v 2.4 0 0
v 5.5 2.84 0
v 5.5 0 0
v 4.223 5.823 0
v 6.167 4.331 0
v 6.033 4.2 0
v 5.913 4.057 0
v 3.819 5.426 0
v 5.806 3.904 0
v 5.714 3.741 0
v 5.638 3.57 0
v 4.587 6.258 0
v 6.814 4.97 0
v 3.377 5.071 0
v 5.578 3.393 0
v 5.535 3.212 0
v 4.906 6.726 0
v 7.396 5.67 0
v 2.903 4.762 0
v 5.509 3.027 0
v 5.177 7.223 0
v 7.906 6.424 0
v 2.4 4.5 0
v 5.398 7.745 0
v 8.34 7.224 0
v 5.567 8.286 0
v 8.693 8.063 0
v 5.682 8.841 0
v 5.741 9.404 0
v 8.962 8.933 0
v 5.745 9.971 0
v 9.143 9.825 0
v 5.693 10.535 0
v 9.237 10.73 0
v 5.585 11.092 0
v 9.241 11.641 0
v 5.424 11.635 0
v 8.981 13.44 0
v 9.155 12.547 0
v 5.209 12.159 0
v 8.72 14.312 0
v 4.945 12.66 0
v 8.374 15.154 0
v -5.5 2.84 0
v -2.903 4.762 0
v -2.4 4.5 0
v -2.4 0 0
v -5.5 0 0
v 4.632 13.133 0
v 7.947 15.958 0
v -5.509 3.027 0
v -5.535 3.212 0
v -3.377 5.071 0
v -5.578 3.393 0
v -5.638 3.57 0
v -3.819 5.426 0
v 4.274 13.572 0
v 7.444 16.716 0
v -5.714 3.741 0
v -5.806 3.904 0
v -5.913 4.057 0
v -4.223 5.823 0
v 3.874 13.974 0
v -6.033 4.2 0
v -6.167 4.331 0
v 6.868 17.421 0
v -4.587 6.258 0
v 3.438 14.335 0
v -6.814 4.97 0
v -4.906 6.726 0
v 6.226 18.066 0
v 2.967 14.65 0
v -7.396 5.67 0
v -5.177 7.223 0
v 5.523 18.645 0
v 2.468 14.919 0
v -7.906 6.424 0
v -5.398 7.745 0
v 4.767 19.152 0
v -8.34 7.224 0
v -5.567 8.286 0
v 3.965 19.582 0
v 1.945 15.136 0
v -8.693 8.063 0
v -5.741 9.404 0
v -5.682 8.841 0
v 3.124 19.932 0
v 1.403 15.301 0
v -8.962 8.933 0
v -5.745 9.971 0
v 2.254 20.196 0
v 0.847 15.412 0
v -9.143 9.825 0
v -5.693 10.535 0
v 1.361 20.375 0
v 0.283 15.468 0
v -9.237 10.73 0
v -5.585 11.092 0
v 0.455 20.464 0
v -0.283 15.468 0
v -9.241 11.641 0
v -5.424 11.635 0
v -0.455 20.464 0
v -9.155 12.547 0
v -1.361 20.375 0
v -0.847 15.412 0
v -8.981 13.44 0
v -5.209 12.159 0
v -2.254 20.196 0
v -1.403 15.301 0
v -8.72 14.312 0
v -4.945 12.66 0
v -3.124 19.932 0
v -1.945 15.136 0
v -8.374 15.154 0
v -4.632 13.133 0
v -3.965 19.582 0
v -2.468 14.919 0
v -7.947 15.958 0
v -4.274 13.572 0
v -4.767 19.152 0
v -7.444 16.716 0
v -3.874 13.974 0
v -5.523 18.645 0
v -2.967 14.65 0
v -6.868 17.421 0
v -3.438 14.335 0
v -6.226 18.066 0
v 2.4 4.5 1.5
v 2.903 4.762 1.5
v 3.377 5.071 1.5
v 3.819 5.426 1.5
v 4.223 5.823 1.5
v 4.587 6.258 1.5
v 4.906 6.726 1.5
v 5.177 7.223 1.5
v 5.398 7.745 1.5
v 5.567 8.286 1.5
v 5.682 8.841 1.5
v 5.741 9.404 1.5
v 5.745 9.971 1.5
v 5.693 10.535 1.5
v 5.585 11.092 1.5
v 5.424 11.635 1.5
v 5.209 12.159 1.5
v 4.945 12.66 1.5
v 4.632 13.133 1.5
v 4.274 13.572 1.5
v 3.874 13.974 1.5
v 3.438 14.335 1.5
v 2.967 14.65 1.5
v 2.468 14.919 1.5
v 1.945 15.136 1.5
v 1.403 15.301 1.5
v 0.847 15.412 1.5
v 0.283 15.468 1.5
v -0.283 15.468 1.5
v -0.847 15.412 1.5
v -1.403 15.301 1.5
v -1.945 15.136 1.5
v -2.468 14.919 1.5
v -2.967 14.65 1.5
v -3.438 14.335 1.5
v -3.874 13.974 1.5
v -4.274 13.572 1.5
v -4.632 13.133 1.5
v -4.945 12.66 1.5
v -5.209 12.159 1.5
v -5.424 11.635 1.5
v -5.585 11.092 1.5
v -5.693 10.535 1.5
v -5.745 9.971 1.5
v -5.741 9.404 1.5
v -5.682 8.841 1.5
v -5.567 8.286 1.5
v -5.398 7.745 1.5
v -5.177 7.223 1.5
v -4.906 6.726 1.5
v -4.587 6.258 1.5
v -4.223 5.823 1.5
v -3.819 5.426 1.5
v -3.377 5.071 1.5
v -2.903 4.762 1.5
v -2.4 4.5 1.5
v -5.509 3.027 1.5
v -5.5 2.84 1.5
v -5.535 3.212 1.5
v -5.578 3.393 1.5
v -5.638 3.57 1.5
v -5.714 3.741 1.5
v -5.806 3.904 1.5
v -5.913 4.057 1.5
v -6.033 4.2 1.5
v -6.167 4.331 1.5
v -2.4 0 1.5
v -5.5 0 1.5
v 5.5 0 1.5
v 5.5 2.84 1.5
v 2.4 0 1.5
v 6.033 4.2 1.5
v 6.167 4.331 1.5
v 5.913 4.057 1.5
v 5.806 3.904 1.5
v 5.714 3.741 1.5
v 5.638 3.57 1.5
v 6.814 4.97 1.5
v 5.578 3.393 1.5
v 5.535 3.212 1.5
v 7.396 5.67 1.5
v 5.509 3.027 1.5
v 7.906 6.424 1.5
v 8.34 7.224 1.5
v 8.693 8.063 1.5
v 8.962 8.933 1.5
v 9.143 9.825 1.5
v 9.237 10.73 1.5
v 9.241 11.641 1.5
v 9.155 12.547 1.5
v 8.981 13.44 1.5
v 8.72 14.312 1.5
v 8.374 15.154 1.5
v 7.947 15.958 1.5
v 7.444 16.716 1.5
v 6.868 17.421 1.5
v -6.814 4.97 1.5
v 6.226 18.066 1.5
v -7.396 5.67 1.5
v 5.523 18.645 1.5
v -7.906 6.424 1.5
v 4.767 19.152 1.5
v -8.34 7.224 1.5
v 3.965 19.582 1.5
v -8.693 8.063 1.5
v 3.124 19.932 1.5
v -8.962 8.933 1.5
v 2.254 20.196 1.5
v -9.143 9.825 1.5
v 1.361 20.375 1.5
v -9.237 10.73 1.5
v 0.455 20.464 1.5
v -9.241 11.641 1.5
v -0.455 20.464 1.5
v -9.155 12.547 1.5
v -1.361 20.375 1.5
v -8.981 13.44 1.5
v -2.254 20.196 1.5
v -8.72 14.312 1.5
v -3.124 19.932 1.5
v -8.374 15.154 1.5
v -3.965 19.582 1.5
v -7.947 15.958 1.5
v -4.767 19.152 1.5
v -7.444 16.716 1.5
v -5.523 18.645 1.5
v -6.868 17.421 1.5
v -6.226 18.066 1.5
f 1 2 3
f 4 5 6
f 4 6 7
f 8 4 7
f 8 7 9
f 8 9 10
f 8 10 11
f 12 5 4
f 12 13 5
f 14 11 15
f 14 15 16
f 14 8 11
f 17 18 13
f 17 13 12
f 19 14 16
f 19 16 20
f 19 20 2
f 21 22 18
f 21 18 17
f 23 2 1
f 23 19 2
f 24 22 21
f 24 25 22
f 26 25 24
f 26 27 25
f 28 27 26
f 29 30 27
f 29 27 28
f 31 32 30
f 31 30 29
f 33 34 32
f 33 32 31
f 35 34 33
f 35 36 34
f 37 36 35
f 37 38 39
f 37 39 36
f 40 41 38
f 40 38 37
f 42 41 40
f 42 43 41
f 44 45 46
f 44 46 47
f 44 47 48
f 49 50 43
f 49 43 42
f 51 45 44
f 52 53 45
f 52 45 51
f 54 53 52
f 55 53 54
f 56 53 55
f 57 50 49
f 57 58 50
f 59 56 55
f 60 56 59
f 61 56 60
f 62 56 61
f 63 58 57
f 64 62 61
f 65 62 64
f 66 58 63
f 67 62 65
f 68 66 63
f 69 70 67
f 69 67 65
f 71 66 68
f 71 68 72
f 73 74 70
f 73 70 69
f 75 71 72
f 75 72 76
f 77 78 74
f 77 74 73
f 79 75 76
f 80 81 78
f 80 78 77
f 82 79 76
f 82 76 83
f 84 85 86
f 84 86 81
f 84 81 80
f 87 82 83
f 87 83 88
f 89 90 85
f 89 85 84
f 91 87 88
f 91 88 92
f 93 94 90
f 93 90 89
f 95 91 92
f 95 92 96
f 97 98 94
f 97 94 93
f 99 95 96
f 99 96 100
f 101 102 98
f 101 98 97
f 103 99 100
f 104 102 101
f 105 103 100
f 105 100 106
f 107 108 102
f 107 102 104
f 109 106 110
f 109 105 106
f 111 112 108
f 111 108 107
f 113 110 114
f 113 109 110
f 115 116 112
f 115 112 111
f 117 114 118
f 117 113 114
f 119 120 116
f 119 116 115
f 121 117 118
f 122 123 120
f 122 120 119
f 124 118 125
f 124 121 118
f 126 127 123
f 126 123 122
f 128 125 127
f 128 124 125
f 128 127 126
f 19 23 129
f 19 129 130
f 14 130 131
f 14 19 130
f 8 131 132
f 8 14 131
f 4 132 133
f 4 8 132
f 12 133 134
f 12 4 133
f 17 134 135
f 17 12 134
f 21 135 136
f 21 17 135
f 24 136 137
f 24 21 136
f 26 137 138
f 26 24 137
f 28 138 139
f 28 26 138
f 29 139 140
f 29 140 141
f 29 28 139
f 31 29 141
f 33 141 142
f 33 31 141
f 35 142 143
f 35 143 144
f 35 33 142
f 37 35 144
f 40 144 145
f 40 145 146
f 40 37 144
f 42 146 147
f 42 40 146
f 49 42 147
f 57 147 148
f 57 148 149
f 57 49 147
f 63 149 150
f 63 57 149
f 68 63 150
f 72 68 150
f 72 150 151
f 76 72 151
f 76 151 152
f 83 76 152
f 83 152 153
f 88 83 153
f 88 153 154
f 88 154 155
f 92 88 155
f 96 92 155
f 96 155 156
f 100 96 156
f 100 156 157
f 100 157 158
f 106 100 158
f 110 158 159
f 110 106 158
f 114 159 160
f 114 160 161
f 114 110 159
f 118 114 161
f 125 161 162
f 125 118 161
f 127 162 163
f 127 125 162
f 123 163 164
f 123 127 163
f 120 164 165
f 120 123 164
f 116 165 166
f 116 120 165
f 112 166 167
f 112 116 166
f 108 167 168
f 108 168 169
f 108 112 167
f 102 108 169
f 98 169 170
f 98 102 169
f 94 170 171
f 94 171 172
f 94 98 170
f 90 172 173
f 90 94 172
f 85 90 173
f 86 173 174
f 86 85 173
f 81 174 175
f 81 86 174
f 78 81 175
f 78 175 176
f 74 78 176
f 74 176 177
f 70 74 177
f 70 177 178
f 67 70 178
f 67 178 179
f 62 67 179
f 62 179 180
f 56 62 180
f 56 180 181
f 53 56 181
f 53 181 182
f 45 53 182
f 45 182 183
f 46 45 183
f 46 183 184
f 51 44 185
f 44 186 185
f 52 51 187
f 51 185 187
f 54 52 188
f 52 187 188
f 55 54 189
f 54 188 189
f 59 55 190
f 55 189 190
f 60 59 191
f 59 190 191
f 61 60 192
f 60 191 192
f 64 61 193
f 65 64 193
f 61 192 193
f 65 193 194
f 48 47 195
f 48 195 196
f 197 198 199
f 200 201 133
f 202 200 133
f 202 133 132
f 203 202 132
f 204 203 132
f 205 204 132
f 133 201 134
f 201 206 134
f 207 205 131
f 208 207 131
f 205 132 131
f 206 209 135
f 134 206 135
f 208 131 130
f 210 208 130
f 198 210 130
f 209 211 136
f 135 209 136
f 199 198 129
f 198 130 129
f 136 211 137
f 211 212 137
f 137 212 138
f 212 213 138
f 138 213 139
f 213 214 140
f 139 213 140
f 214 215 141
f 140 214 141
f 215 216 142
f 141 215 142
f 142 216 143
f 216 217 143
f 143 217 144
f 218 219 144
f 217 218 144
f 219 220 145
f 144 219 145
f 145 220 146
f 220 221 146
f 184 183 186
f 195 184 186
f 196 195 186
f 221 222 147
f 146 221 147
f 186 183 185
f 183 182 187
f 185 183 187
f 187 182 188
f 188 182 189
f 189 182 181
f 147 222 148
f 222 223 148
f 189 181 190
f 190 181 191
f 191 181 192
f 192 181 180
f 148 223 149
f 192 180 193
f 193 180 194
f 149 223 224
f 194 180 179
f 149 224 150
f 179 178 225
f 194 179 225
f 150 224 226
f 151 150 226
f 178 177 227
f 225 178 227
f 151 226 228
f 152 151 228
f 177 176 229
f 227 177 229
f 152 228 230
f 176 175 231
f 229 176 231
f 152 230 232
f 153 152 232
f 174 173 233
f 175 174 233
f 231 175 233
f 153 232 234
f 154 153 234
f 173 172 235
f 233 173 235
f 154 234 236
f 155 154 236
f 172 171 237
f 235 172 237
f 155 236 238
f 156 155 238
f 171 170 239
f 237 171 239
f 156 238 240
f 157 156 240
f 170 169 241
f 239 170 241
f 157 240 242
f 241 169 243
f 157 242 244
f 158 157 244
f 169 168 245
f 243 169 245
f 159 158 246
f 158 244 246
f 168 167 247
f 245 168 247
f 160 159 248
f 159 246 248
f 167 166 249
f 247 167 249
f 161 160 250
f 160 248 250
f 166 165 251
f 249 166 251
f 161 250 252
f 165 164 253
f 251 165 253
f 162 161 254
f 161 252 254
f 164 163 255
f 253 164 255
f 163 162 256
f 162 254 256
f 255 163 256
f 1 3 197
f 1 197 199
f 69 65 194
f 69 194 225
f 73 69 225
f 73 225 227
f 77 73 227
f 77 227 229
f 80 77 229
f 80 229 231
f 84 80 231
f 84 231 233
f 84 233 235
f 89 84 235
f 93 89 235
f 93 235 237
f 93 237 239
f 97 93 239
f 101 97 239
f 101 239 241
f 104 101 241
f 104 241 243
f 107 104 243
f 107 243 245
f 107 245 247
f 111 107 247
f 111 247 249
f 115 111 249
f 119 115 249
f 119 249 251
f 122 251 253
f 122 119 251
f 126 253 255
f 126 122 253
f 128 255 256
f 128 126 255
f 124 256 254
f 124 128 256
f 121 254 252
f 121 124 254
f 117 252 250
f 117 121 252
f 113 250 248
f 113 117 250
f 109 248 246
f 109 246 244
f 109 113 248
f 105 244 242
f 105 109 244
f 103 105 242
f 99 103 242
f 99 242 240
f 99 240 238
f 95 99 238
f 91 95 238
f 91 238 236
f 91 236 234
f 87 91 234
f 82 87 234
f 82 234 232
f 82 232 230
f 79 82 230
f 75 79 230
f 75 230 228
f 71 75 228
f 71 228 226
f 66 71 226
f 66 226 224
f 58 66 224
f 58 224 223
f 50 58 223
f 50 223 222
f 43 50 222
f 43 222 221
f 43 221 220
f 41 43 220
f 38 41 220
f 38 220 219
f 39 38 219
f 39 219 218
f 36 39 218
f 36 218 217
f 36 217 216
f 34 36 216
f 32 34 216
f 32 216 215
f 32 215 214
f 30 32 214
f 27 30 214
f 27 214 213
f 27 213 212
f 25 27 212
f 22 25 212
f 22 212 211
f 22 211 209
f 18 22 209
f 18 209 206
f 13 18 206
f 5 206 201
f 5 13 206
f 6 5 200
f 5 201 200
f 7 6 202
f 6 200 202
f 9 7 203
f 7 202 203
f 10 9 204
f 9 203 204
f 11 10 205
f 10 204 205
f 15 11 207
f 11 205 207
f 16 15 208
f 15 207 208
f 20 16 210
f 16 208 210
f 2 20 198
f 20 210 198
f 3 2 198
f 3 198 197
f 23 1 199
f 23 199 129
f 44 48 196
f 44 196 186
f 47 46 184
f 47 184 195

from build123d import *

# Parameters (mm, degrees)
BOSS_EXTRUDE1_DEPTH = 1.5
FILLET1_R           = 2


with BuildPart() as part:
    # Sketch1 → Boss-Extrude1 (new body)
    with BuildSketch(Plane.XY):
        with BuildLine():
            ThreePointArc((2.4, 4.5), (0, 15.475179423), (-2.4, 4.5))
            Line((-2.4, 4.5), (-2.4, 0))
            Line((-2.4, 0), (-5.5, 0))
            Line((-5.5, 0), (-5.5, 3.787942032))
            ThreePointArc((-5.5, 3.787942032), (0, 20.475179423), (5.5, 3.787942032))
            Line((5.5, 3.787942032), (5.5, 0))
            Line((5.5, 0), (2.4, 0))
            Line((2.4, 0), (2.4, 4.5))
        make_face()
    extrude(amount=BOSS_EXTRUDE1_DEPTH)

    # Fillet1
    fillet1_edges = [part.edges().sort_by_distance(p)[0] for p in [
        (-5.5, 3.787942032, 0.75),
        (5.5, 3.787942032, 0.75),
    ]]
    fillet(fillet1_edges, radius=FILLET1_R)


solid = part.part
